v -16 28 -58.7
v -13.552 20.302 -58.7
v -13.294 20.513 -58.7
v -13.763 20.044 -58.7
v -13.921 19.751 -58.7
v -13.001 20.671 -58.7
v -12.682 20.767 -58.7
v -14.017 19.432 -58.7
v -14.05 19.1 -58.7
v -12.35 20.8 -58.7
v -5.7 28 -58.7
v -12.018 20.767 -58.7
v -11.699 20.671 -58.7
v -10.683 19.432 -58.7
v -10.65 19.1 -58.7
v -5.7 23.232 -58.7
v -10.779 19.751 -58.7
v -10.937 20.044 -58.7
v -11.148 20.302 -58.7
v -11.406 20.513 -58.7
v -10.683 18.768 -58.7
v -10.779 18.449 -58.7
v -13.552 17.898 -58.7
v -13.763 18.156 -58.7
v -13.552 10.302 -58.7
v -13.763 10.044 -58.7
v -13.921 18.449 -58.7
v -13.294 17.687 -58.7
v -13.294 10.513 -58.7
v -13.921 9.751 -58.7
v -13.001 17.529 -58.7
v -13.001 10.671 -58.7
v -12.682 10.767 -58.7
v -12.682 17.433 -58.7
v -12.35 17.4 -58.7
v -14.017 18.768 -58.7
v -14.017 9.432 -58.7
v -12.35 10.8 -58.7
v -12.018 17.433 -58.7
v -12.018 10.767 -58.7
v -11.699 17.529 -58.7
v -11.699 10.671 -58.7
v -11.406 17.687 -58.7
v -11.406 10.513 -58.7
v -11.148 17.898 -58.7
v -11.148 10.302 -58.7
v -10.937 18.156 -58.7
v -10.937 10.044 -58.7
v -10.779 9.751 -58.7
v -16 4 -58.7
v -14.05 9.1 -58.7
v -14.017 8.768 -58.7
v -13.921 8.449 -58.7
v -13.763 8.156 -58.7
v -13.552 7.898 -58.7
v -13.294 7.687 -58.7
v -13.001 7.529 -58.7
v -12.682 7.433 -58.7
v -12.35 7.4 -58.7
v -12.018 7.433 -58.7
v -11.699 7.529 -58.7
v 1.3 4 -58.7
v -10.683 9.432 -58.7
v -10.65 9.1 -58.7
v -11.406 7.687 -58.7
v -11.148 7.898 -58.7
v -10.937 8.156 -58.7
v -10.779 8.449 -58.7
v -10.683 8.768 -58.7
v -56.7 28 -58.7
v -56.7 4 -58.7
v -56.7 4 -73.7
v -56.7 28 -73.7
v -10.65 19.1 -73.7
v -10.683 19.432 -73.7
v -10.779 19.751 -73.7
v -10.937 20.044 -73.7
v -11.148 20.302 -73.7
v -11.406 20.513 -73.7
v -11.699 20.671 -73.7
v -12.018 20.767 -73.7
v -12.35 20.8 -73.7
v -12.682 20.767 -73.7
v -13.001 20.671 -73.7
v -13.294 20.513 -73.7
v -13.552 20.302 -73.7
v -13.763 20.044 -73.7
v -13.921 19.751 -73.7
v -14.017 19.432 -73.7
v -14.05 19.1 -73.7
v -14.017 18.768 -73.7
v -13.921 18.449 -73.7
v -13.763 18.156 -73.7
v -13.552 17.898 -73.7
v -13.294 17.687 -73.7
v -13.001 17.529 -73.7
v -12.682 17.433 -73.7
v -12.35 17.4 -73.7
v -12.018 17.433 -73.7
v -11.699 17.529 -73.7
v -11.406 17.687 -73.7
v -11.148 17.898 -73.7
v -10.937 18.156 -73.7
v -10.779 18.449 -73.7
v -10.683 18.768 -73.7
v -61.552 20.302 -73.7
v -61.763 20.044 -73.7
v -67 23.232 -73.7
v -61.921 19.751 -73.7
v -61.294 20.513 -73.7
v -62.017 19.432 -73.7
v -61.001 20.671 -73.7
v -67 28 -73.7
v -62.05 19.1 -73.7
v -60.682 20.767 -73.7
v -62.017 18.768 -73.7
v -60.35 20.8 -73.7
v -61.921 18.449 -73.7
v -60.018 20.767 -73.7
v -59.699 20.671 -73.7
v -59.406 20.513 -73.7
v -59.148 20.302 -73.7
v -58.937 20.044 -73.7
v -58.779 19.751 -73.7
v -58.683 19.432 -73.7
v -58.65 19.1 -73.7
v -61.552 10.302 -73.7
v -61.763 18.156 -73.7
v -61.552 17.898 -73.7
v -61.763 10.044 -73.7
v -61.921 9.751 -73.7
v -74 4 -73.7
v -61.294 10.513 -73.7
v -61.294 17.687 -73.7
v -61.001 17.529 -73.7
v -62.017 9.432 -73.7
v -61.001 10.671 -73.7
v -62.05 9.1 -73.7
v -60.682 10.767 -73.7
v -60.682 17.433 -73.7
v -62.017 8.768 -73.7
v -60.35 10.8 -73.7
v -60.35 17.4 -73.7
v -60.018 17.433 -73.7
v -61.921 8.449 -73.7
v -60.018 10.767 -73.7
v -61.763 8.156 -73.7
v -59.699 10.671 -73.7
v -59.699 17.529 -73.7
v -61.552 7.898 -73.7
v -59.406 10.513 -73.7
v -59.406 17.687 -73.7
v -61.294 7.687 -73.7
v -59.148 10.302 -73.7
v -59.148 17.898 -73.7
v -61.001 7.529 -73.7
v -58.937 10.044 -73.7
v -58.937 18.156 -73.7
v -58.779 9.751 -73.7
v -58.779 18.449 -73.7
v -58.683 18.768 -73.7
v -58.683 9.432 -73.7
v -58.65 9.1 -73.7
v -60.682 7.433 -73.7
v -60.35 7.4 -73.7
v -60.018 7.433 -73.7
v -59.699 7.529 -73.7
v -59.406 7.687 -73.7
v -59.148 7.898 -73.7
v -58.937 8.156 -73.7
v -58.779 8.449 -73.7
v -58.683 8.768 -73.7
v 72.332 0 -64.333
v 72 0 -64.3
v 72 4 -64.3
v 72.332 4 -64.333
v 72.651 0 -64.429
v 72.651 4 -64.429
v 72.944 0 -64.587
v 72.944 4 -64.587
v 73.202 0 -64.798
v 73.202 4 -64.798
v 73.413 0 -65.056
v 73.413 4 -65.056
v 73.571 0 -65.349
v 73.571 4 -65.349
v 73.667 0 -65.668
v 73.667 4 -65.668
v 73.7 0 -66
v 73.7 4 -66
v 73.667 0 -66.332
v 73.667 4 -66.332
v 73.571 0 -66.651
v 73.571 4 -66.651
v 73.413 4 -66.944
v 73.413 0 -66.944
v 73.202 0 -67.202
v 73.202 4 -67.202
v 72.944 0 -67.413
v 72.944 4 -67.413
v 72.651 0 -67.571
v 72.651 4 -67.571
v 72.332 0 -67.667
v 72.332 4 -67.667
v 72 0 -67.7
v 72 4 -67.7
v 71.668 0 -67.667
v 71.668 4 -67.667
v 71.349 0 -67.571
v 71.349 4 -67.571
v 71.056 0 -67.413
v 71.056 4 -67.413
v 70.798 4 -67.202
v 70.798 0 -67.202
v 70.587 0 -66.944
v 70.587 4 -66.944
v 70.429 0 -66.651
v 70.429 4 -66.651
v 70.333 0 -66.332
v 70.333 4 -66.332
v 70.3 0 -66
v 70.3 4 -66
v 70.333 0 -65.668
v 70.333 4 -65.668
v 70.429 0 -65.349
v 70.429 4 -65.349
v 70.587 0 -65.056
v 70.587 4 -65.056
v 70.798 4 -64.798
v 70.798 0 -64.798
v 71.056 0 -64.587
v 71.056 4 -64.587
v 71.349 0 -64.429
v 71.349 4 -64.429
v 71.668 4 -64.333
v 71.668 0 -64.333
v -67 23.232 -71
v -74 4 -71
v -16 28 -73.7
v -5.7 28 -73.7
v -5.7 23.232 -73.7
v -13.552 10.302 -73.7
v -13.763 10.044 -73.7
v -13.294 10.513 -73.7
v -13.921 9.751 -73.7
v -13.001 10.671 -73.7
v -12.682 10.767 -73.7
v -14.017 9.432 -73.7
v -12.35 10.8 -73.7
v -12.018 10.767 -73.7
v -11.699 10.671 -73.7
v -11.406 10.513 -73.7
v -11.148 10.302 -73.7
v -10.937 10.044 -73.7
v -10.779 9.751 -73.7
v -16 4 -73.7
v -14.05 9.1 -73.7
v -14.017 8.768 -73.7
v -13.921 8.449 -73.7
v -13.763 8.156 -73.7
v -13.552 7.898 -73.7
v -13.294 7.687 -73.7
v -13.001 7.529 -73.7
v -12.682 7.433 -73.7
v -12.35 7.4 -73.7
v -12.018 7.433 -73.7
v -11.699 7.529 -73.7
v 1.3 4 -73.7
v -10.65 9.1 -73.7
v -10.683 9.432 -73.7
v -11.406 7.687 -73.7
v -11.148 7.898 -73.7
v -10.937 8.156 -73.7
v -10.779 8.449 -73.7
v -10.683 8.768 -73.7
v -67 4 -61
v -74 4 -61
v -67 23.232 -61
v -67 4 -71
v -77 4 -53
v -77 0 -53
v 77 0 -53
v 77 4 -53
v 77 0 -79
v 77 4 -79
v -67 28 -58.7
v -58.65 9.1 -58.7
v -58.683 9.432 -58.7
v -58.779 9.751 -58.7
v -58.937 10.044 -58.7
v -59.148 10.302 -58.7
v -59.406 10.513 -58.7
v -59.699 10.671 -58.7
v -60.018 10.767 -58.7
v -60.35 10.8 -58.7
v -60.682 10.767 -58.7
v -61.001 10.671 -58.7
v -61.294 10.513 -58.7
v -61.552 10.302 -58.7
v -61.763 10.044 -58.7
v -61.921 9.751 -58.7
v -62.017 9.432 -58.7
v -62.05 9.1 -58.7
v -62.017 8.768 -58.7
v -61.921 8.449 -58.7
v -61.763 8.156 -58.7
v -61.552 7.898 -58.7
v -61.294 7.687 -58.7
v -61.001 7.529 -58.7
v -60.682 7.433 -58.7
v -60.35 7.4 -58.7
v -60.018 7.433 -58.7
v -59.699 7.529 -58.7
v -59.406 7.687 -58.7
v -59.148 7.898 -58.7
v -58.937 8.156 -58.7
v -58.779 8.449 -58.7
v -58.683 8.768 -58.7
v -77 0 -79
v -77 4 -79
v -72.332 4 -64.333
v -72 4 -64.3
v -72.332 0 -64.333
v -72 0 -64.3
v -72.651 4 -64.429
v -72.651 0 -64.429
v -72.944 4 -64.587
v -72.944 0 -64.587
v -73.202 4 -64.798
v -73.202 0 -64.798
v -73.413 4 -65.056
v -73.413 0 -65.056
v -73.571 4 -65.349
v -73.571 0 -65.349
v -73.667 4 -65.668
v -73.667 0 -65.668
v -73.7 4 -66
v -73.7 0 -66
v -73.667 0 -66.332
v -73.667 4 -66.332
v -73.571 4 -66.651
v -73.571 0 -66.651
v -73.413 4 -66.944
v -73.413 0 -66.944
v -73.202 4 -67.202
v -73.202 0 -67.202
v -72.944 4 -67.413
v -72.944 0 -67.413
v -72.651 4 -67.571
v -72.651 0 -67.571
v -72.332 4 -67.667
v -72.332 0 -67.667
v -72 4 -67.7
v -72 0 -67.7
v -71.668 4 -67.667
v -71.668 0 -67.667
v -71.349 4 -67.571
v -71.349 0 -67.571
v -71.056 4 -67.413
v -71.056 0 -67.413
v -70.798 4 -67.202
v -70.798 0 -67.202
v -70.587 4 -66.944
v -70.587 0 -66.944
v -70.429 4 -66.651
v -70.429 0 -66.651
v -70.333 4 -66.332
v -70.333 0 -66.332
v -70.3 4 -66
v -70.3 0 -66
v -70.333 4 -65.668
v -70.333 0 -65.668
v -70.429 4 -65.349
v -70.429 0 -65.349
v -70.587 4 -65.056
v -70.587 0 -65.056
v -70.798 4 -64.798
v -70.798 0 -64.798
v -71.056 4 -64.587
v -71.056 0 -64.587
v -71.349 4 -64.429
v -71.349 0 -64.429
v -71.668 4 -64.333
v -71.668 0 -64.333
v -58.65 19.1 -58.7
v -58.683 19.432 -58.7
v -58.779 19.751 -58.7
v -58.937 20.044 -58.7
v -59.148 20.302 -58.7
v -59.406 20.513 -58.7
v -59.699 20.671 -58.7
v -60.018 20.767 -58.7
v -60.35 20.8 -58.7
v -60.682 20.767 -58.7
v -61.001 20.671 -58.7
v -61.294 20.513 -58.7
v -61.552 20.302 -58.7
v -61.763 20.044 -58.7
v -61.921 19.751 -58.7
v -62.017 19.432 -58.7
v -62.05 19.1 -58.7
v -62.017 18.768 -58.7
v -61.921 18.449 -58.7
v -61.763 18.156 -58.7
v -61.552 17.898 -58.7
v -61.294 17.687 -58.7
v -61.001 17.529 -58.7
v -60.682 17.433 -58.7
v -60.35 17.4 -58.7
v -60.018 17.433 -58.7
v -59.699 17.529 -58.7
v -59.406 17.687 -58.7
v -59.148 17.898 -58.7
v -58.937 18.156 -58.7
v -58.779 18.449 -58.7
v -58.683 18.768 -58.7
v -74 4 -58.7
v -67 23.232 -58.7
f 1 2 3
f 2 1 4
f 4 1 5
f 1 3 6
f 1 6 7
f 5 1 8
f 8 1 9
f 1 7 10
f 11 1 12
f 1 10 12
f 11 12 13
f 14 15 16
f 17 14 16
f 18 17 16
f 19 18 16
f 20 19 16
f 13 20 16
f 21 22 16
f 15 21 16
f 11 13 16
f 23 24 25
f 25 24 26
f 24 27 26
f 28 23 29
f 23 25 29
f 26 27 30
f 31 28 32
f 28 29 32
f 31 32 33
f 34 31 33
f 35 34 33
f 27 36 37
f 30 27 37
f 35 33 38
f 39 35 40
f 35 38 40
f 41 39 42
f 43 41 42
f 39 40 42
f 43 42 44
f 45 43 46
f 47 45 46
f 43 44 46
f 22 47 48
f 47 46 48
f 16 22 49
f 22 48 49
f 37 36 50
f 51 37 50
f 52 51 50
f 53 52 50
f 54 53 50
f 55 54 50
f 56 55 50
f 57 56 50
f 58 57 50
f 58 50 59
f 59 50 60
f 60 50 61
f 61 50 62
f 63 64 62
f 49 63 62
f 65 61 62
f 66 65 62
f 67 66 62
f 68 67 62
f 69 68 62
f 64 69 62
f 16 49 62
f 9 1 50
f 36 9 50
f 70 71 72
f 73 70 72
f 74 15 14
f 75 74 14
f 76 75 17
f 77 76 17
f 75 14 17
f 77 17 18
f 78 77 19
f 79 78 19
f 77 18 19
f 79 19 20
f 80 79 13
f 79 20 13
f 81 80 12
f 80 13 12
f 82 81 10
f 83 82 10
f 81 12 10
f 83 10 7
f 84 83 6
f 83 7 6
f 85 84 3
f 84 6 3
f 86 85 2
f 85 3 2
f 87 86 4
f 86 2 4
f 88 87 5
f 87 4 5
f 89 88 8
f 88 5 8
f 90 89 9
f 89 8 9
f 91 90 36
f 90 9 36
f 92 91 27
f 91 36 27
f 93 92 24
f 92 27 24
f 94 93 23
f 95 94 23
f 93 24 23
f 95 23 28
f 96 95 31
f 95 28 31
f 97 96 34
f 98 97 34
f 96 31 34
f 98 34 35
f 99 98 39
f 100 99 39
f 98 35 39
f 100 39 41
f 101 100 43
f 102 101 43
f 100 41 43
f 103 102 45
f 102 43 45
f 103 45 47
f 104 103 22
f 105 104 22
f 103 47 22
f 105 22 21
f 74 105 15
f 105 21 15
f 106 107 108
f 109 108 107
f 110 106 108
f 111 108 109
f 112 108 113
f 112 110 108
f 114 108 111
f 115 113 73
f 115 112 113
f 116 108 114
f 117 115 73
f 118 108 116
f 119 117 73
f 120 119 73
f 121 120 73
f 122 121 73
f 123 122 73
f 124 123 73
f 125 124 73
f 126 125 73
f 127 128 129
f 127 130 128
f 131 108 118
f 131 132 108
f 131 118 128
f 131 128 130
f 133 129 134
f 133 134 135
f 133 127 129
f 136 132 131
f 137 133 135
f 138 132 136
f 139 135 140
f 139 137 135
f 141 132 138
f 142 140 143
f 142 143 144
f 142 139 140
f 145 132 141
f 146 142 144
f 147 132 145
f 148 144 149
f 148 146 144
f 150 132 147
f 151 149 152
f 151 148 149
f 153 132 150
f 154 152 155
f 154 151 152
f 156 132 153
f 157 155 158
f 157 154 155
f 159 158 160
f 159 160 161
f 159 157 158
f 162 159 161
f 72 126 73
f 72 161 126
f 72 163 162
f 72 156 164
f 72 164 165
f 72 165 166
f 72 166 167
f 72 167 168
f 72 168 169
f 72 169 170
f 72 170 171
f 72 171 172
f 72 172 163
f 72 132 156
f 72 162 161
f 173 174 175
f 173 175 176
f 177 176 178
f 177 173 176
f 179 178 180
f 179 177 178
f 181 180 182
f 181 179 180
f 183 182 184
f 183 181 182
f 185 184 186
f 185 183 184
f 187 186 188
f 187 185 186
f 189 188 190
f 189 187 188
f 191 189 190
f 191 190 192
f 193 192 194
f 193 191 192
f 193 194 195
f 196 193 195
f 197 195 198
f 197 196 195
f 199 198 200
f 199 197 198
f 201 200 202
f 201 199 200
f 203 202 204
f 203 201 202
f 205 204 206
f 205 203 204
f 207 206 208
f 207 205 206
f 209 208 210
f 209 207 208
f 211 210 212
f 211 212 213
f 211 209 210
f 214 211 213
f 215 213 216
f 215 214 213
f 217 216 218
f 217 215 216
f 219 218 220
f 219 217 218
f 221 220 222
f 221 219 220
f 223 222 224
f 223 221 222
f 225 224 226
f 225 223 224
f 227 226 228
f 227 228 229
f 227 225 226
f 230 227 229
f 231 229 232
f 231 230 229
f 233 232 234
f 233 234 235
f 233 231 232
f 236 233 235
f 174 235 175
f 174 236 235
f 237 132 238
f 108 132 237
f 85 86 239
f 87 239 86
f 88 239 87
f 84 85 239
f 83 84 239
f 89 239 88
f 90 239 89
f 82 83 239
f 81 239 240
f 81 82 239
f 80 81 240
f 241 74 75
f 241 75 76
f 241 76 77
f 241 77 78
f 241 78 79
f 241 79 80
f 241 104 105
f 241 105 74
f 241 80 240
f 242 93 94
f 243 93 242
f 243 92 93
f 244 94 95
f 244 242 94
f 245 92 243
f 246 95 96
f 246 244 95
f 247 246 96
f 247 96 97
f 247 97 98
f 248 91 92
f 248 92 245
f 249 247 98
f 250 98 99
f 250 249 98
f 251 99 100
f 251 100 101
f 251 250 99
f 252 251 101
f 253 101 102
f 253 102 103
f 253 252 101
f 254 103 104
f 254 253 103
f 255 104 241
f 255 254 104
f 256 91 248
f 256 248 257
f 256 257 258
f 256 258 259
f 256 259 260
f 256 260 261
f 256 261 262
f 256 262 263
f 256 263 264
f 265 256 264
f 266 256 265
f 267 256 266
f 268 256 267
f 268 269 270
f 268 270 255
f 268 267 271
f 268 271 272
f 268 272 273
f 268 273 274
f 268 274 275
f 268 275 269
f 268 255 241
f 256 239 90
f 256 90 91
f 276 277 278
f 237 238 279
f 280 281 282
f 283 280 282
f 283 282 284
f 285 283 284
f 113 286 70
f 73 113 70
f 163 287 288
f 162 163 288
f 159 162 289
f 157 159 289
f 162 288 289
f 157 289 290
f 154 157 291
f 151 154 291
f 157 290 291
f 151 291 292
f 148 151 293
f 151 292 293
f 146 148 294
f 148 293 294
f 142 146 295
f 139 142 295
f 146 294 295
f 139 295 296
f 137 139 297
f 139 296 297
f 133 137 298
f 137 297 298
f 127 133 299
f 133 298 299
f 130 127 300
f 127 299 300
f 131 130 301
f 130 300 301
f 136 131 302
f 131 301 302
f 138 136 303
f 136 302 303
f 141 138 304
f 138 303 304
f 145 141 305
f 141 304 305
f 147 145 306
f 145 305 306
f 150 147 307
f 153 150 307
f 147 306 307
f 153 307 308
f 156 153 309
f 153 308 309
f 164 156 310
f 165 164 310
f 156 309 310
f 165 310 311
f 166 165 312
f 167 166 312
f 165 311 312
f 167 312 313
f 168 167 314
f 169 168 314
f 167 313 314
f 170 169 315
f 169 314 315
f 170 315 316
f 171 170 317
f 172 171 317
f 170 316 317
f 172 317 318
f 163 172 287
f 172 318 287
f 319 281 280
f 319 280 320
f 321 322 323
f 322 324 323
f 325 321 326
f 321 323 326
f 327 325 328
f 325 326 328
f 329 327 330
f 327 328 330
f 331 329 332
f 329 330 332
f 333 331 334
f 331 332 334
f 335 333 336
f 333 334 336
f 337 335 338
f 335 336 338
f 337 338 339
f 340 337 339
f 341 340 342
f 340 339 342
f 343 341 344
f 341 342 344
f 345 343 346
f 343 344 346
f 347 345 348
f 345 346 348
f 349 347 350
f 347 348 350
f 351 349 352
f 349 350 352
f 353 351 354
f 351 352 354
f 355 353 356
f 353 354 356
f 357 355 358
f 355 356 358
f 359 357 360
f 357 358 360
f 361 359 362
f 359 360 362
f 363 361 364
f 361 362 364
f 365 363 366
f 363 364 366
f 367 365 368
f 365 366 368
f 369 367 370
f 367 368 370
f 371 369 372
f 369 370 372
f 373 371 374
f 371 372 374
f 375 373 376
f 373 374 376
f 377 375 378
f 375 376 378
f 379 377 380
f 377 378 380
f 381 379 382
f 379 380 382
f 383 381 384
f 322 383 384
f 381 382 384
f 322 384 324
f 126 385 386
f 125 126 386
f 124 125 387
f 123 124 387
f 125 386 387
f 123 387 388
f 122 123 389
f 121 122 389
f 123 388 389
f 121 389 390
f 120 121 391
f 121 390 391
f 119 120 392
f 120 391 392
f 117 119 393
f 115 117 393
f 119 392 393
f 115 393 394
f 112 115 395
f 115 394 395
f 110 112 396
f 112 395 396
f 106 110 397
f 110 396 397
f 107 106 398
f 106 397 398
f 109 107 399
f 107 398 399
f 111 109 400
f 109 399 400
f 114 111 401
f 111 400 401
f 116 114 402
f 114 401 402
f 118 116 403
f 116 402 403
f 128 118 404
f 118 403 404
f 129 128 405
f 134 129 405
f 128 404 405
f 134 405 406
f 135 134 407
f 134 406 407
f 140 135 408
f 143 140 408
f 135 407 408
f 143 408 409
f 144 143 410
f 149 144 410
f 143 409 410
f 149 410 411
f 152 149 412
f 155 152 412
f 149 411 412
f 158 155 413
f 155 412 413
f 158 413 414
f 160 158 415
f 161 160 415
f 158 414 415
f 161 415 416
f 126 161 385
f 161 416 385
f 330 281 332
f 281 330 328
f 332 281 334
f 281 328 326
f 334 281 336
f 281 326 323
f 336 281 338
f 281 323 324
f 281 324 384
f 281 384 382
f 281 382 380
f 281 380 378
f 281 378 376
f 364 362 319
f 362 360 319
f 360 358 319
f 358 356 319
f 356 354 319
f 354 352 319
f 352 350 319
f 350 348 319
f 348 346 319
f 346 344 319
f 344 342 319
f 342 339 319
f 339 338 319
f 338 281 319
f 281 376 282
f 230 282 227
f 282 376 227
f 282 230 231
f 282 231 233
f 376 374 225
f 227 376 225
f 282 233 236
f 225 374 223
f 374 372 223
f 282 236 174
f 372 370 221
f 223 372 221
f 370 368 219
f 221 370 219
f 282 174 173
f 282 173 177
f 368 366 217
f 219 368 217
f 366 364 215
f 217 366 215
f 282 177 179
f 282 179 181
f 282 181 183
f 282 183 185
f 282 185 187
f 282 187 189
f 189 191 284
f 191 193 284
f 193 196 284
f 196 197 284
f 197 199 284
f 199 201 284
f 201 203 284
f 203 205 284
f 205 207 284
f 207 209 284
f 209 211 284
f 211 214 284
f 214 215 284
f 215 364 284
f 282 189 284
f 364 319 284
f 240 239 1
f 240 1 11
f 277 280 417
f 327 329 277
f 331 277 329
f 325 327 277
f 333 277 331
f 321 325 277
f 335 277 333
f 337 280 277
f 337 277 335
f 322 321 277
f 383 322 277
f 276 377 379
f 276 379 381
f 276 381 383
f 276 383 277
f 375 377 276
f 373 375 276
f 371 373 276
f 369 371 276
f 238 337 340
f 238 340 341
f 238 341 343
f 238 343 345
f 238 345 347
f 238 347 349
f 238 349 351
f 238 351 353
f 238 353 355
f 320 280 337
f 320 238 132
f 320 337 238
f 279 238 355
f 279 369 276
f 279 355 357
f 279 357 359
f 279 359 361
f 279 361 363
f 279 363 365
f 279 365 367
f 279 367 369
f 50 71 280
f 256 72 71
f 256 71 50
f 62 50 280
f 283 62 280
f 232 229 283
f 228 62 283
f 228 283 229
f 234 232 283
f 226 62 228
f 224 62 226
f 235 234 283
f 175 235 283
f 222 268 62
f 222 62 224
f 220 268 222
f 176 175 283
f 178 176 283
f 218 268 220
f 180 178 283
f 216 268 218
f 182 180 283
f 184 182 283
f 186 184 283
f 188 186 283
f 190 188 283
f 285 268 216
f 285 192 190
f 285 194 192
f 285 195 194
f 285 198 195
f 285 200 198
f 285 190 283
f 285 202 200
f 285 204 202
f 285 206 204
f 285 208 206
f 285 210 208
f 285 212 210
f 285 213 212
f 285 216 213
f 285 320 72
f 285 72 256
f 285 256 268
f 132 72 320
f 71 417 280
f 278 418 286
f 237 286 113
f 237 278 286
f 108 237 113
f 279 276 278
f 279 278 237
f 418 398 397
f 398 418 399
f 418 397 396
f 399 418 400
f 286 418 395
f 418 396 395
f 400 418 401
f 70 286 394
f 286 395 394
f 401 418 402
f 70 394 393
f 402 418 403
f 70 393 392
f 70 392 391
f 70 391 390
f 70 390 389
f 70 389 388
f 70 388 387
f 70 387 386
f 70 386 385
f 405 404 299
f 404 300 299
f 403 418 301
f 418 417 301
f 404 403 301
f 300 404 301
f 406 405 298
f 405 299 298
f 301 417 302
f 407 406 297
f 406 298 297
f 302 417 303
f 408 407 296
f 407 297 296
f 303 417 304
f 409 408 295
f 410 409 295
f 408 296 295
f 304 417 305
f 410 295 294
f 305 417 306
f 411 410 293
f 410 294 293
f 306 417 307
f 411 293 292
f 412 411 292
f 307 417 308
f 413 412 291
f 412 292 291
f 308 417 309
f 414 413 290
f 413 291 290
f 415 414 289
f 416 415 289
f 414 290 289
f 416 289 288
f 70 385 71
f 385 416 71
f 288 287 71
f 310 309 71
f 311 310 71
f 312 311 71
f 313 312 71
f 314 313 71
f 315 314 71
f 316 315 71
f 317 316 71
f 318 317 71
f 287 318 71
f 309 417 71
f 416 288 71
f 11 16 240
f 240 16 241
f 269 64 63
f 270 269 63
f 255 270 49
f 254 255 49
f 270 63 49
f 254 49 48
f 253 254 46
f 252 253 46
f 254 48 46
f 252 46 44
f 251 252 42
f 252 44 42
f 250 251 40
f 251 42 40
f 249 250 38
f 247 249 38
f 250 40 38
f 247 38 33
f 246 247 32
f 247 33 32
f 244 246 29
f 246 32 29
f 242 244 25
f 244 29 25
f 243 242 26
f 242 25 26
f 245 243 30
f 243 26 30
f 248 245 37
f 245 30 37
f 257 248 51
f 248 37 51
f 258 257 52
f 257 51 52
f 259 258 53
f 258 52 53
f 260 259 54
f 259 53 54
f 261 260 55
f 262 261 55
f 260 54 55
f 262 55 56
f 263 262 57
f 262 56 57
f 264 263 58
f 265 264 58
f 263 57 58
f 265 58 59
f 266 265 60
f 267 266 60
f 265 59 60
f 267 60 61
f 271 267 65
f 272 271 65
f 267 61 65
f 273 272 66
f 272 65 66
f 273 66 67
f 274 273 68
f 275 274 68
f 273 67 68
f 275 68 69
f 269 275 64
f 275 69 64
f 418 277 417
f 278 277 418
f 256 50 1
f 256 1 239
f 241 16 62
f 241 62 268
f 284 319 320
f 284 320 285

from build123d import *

# Parameters (mm, degrees)
SKETCH1_W           = 154
SKETCH1_H           = 26
SKETCH1_R           = 1.7
BOSS_EXTRUDE1_DEPTH = 4
SKETCH3_W           = 10.3
SKETCH3_H           = 15
BOSS_EXTRUDE2_DEPTH = 24
CHAMFER2_SIZE       = 7
CHAMFER2_SIZE2      = 19.232341936
CHAMFER3_SIZE       = 7
CHAMFER3_SIZE_2     = 19.232341936
SKETCH4_W           = 10
SKETCH4_H           = 10
CUT_EXTRUDE1_DEPTH  = 24
SKETCH6_R           = 1.7
CUT_EXTRUDE2_DEPTH  = 15


with BuildPart() as part:
    # Sketch1 → Boss-Extrude1 (new body)
    with BuildSketch(Plane(origin=(0, 0, 0), x_dir=(1, 0, 0), z_dir=(0, 1, 0))):
        with Locations((0, 66)):
            Rectangle(SKETCH1_W, SKETCH1_H)
        with Locations(Location((72, 66, 0), (0, 0, 270))):
            Circle(SKETCH1_R, mode=Mode.SUBTRACT)
        with Locations(Location((-72, 66, 0), (0, 0, 270))):
            Circle(SKETCH1_R, mode=Mode.SUBTRACT)
    extrude(amount=BOSS_EXTRUDE1_DEPTH)

    # Sketch3 → Boss-Extrude2 (add)
    with BuildSketch(Plane(origin=(0, 4, 0), x_dir=(1, 0, 0), z_dir=(0, 1, 0))):
        with Locations((-61.85, 66.2)):
            Rectangle(SKETCH3_W, SKETCH3_H)
        with Locations((-10.85, 66.2)):
            Rectangle(SKETCH3_W, SKETCH3_H)
    extrude(amount=BOSS_EXTRUDE2_DEPTH)

    # Chamfer2
    chamfer2_edges = [part.edges().sort_by_distance(p)[0] for p in [
        (-5.7, 4, -66.2),
    ]]
    chamfer2_side = [part.faces().sort_by_distance(p)[0] for p in [
        (3.054836525, 4, -65.983192096),
    ]]
    chamfer(chamfer2_edges, length=CHAMFER2_SIZE, length2=CHAMFER2_SIZE2, reference=chamfer2_side[0])

    # Chamfer3
    # the kernel refuses this chamfer: 19.232341936, 7 mm, written as the material it adds along each edge
    with BuildSketch(Plane(origin=(-67, 4, -73.7), x_dir=(-0.9950833631817486, -0.09904090225205066, 0), z_dir=(0, 0, 1))) as chamfer3_piece_1_section:
        Polygon((CHAMFER3_SIZE * 0.995083363182, -CHAMFER3_SIZE * 0.0990409022521), (-CHAMFER3_SIZE_2 * 0.099040902253, -CHAMFER3_SIZE_2 * 0.995083363191), (0, 0), align=None)
    chamfer3_piece_1 = extrude(amount=15, mode=Mode.PRIVATE)
    chamfer3_piece_1 = chamfer3_piece_1 - Plane(origin=(-72, 10.759738183, -66), x_dir=(0, 0, 1), z_dir=(0, -1, 0)) * Cylinder(1.7, 107, mode=Mode.PRIVATE)
    add(chamfer3_piece_1)

    # Sketch4 → Cut-Extrude1 (cut)
    with BuildSketch(Plane(origin=(0, 28, 0), x_dir=(1, 0, 0), z_dir=(0, 1, 0))):
        with Locations((-72, 66)):
            Rectangle(SKETCH4_W, SKETCH4_H)
    extrude(amount=-CUT_EXTRUDE1_DEPTH, mode=Mode.SUBTRACT)

    # Sketch6 → Cut-Extrude2 (cut)
    with BuildSketch(Plane.XY.offset(-58.7)):
        with Locations((-60.35, 9.1)):
            Circle(SKETCH6_R)
        with Locations((-60.35, 19.1)):
            Circle(SKETCH6_R)
        with Locations((-12.35, 9.1)):
            Circle(SKETCH6_R)
        with Locations((-12.35, 19.1)):
            Circle(SKETCH6_R)
    extrude(amount=-CUT_EXTRUDE2_DEPTH, mode=Mode.SUBTRACT)


solid = part.part
